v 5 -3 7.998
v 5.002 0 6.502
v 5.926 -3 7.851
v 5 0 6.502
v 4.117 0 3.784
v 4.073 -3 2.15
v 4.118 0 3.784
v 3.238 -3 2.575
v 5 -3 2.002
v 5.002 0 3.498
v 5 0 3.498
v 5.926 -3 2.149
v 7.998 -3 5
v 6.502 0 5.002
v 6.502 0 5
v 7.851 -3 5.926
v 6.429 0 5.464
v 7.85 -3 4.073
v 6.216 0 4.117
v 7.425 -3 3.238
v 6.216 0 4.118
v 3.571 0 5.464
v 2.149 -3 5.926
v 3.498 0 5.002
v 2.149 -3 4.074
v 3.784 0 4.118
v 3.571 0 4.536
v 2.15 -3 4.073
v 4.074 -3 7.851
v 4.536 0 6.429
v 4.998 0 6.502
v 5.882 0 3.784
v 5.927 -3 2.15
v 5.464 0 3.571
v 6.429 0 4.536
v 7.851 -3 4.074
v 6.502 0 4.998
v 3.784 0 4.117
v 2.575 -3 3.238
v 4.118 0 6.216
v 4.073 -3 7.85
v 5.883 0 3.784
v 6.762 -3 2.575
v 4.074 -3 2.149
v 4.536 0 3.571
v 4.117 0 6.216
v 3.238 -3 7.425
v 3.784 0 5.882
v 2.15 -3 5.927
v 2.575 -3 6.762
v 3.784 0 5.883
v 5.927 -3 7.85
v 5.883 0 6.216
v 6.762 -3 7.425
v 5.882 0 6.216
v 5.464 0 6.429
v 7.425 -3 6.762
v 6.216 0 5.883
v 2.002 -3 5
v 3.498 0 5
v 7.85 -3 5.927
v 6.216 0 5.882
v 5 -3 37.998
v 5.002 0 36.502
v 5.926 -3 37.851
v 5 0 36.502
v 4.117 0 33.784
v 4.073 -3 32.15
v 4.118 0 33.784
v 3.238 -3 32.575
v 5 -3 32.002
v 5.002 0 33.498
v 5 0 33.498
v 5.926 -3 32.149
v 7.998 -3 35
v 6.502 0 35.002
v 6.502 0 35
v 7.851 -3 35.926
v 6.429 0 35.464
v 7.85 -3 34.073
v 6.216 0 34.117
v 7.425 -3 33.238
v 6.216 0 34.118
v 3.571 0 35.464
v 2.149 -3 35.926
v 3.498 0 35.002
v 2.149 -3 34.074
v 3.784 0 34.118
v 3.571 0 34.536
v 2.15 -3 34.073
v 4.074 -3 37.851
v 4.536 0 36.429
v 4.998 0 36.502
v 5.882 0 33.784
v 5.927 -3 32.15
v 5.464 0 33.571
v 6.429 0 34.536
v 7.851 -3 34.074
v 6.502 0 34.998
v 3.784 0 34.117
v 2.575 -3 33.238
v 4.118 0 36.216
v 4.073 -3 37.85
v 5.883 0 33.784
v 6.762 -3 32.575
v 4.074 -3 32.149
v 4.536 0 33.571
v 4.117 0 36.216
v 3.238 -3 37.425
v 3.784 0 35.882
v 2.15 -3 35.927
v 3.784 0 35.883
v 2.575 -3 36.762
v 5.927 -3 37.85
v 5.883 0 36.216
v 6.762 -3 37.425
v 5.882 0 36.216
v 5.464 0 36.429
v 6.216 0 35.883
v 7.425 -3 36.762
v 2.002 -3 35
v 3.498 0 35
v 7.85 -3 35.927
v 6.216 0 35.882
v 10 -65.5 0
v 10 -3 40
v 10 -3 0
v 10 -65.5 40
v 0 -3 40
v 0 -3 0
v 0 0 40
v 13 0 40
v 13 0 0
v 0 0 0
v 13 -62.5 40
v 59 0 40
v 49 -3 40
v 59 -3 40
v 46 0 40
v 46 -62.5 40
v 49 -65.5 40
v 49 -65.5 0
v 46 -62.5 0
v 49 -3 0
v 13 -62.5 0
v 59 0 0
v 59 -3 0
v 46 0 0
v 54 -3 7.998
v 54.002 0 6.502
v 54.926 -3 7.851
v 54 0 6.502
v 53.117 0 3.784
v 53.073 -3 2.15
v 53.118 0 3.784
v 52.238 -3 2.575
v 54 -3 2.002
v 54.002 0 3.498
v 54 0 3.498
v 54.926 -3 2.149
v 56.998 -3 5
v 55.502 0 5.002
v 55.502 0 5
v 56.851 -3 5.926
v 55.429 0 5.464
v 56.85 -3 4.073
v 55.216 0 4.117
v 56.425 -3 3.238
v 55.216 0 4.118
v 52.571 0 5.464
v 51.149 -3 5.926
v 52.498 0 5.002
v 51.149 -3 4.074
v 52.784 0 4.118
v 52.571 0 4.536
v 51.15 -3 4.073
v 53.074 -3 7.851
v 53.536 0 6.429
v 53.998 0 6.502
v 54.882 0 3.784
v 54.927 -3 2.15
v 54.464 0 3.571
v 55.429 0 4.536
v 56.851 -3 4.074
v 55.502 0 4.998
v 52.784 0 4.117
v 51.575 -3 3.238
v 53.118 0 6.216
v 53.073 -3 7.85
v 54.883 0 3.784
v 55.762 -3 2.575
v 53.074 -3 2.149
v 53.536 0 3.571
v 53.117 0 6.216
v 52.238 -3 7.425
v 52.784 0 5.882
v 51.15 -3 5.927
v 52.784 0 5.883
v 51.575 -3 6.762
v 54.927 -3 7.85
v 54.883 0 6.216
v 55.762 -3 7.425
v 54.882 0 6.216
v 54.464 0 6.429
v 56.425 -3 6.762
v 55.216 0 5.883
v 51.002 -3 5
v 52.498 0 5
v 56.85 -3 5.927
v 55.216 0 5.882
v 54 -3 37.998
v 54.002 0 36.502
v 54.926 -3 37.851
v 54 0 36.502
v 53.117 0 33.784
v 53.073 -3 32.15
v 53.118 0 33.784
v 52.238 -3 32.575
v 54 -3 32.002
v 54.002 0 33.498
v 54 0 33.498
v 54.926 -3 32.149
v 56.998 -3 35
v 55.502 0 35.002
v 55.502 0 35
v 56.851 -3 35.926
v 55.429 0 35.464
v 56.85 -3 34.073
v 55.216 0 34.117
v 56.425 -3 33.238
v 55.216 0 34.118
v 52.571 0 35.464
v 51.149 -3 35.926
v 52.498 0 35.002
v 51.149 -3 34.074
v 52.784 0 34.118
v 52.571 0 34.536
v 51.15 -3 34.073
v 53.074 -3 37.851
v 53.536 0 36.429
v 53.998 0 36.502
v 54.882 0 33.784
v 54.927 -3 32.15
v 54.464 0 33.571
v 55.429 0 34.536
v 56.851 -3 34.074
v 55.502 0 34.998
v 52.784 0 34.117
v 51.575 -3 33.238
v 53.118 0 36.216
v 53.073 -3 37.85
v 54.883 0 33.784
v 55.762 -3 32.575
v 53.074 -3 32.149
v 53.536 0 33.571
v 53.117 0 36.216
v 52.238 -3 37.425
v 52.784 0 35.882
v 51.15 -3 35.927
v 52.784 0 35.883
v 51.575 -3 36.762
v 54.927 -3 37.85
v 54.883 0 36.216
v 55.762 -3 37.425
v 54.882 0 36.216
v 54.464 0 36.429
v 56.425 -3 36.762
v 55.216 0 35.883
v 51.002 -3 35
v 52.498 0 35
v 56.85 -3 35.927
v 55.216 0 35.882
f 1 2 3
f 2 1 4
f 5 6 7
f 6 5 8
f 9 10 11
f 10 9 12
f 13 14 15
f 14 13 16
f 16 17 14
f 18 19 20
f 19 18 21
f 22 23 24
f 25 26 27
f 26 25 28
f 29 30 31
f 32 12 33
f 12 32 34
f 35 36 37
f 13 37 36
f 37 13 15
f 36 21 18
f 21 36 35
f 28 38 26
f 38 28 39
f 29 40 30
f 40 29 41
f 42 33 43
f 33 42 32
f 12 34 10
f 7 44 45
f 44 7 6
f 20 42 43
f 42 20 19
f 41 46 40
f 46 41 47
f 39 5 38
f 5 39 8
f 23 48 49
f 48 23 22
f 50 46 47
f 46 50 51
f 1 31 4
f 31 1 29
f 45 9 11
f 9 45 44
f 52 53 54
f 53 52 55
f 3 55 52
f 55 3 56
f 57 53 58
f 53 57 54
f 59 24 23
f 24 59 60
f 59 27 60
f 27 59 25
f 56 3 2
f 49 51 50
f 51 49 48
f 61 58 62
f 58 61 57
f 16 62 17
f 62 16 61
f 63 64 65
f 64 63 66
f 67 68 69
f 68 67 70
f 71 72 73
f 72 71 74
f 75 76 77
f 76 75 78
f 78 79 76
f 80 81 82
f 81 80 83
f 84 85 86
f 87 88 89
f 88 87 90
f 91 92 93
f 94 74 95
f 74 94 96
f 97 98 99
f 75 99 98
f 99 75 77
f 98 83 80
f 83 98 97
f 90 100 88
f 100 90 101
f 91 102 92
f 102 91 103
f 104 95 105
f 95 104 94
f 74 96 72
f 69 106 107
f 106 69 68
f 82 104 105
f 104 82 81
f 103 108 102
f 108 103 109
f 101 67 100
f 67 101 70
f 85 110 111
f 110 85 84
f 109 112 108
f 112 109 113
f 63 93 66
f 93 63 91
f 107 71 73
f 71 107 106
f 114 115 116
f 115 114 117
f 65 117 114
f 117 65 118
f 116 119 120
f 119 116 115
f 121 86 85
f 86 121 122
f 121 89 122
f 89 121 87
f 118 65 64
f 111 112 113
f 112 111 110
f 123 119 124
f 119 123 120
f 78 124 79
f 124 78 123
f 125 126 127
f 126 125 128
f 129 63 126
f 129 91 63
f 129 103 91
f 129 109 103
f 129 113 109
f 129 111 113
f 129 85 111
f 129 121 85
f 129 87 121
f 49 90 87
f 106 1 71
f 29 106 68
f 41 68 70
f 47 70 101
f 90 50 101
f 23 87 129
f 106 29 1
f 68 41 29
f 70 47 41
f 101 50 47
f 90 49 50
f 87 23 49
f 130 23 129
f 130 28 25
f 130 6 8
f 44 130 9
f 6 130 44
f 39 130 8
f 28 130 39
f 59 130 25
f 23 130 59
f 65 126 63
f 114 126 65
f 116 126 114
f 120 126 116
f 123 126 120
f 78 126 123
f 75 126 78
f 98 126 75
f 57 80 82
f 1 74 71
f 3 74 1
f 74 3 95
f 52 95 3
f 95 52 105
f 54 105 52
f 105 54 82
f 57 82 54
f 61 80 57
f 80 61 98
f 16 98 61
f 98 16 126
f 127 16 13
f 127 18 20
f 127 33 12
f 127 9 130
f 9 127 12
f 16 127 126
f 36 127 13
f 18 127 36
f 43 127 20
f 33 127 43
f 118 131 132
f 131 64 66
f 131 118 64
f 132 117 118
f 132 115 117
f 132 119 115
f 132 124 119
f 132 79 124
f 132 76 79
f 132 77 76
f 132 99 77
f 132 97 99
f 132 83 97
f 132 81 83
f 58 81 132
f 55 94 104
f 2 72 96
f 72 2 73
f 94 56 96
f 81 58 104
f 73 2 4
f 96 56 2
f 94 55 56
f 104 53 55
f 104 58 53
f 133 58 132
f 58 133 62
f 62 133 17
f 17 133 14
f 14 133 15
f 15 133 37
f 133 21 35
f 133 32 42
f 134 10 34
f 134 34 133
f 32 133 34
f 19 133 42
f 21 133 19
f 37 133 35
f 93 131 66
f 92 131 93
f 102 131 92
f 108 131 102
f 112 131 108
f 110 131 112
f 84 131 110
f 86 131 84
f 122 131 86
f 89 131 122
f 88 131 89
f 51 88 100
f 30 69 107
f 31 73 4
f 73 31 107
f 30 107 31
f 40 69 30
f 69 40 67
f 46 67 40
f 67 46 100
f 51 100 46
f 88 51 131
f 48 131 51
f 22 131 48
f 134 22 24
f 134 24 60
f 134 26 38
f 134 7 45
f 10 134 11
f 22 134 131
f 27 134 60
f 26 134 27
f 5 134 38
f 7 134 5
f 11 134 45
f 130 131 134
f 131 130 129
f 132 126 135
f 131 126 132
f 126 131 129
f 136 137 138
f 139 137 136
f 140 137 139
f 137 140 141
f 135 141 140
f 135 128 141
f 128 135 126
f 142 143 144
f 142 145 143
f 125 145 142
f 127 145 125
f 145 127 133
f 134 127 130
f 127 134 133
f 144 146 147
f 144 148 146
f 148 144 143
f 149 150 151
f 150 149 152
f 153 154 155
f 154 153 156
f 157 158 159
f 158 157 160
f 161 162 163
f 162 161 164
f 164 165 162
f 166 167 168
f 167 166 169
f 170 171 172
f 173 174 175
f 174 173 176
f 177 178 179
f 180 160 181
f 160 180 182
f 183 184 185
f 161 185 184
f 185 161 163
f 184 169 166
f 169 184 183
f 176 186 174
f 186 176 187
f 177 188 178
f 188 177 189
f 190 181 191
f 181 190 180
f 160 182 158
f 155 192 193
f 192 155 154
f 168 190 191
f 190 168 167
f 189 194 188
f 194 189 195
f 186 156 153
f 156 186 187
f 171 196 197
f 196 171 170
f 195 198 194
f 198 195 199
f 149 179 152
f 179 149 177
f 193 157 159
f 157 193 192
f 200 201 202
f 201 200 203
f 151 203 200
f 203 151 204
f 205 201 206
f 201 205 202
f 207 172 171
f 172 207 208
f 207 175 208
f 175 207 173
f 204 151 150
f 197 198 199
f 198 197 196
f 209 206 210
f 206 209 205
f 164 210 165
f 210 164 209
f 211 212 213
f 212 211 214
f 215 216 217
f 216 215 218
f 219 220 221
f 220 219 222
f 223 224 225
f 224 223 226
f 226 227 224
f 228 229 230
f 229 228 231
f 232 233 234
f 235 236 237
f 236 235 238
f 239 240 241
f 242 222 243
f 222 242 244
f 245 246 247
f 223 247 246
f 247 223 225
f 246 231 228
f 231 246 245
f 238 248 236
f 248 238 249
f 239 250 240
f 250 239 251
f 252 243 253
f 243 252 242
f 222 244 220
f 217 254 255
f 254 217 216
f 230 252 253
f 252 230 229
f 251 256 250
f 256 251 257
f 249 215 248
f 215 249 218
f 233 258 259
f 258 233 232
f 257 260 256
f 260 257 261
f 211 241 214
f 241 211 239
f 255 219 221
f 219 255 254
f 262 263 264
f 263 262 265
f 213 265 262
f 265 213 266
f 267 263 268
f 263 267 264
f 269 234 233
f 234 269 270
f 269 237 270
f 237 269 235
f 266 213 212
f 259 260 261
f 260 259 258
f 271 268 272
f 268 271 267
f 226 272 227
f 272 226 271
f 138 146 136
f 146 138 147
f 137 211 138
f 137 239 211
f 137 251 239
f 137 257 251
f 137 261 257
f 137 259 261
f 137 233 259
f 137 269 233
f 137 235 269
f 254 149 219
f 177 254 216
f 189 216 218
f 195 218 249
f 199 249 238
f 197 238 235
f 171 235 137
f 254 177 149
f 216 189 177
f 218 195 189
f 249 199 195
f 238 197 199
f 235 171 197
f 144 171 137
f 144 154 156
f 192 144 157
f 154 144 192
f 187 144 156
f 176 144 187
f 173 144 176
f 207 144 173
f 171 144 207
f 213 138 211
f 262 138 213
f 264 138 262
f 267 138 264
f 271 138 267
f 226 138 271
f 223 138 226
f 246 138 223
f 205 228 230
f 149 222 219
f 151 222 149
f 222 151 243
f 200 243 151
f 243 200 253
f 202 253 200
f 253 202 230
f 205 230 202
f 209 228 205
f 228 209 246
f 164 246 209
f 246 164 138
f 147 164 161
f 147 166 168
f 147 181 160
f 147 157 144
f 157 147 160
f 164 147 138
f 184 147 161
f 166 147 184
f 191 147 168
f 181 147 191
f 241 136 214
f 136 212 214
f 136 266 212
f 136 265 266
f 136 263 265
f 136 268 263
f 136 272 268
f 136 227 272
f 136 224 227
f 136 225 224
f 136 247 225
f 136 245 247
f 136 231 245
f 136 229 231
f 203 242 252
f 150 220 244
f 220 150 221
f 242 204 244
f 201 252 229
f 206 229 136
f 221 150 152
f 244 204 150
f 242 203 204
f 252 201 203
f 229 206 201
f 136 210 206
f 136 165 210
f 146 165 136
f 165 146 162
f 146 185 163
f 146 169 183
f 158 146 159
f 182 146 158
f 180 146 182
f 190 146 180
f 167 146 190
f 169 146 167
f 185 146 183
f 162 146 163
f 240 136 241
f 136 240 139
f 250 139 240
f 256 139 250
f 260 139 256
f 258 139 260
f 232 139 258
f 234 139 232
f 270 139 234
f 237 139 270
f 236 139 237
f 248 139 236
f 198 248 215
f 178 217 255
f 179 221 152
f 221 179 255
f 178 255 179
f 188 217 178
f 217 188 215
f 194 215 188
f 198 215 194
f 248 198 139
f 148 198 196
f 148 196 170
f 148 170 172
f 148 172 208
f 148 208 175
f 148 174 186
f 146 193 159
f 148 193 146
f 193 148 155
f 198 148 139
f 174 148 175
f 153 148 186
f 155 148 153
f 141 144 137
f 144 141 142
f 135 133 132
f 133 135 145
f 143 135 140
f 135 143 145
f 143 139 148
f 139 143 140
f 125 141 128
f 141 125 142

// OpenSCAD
// file: simple-rectangular-bracket.scad
// Rectangular bracket with two flanges and holes on each flange
module bracket (
    inner_width,
    inner_height,
    length,
    thickness = 3,
    n_holes_per_side = 2,
    hole_diameter = 3,
    flange_width = 10,
) {
    upper_hole_diameter = hole_diameter  + thickness;

    assert(inner_width > 0, "inner_width must be > 0");
    assert(inner_height > 0, "inner_height must be > 0");
    assert(thickness > 0, "thickness must be > 0");
    assert(n_holes_per_side > 0, "n_holes_per_side must be > 0");
    assert(hole_diameter > 0, "hole_diameter must be > 0");
    assert(flange_width > upper_hole_diameter, "flange_width must be > hole_diameter + thickness");
    assert(length > n_holes_per_side * flange_width, "length must be > n_holes_per_side * flange_width");

    eps = 0.01;
    module flange() {
        difference() {
            cube([flange_width, length, thickness]);
            if (n_holes_per_side == 1) {
                translate([flange_width / 2, length / 2, thickness / 2]) {
                    cylinder(d=hole_diameter, h=thickness + eps, center=true, $fn = 20);
                }
            } else {
                hole_distance = (length - flange_width) / (n_holes_per_side - 1);
                for (i = [0:n_holes_per_side - 1]) {
                    hole_position = flange_width / 2 + hole_distance * i;
                    translate([flange_width / 2, hole_position, thickness / 2]) {
                        cylinder(d1 = hole_diameter, d2 = upper_hole_diameter, h = thickness + eps, center = true, $fn = 20);
                    }
                }
            }
        }
    }

    module side() {
        cube([thickness, length, inner_height]);
    }

    module top() {
        cube([inner_width + thickness * 2, length, thickness]);
    }

    flange();
    translate([flange_width + 2 * thickness + inner_width, 0, 0]) {
        flange();
    }
    translate([flange_width, 0, 0]) {
        side();
    }
    translate([flange_width + thickness + inner_width, 0, 0]) {
        side();
    }
    translate([flange_width, 0, inner_height]) {
        top();
    }
}
// main file
include <simple-rectangular-bracket.scad>

rotate([90, 0, 0]) {
    bracket(
    inner_width = 33,
    inner_height = 62.5,
    length = 40
    );
}
